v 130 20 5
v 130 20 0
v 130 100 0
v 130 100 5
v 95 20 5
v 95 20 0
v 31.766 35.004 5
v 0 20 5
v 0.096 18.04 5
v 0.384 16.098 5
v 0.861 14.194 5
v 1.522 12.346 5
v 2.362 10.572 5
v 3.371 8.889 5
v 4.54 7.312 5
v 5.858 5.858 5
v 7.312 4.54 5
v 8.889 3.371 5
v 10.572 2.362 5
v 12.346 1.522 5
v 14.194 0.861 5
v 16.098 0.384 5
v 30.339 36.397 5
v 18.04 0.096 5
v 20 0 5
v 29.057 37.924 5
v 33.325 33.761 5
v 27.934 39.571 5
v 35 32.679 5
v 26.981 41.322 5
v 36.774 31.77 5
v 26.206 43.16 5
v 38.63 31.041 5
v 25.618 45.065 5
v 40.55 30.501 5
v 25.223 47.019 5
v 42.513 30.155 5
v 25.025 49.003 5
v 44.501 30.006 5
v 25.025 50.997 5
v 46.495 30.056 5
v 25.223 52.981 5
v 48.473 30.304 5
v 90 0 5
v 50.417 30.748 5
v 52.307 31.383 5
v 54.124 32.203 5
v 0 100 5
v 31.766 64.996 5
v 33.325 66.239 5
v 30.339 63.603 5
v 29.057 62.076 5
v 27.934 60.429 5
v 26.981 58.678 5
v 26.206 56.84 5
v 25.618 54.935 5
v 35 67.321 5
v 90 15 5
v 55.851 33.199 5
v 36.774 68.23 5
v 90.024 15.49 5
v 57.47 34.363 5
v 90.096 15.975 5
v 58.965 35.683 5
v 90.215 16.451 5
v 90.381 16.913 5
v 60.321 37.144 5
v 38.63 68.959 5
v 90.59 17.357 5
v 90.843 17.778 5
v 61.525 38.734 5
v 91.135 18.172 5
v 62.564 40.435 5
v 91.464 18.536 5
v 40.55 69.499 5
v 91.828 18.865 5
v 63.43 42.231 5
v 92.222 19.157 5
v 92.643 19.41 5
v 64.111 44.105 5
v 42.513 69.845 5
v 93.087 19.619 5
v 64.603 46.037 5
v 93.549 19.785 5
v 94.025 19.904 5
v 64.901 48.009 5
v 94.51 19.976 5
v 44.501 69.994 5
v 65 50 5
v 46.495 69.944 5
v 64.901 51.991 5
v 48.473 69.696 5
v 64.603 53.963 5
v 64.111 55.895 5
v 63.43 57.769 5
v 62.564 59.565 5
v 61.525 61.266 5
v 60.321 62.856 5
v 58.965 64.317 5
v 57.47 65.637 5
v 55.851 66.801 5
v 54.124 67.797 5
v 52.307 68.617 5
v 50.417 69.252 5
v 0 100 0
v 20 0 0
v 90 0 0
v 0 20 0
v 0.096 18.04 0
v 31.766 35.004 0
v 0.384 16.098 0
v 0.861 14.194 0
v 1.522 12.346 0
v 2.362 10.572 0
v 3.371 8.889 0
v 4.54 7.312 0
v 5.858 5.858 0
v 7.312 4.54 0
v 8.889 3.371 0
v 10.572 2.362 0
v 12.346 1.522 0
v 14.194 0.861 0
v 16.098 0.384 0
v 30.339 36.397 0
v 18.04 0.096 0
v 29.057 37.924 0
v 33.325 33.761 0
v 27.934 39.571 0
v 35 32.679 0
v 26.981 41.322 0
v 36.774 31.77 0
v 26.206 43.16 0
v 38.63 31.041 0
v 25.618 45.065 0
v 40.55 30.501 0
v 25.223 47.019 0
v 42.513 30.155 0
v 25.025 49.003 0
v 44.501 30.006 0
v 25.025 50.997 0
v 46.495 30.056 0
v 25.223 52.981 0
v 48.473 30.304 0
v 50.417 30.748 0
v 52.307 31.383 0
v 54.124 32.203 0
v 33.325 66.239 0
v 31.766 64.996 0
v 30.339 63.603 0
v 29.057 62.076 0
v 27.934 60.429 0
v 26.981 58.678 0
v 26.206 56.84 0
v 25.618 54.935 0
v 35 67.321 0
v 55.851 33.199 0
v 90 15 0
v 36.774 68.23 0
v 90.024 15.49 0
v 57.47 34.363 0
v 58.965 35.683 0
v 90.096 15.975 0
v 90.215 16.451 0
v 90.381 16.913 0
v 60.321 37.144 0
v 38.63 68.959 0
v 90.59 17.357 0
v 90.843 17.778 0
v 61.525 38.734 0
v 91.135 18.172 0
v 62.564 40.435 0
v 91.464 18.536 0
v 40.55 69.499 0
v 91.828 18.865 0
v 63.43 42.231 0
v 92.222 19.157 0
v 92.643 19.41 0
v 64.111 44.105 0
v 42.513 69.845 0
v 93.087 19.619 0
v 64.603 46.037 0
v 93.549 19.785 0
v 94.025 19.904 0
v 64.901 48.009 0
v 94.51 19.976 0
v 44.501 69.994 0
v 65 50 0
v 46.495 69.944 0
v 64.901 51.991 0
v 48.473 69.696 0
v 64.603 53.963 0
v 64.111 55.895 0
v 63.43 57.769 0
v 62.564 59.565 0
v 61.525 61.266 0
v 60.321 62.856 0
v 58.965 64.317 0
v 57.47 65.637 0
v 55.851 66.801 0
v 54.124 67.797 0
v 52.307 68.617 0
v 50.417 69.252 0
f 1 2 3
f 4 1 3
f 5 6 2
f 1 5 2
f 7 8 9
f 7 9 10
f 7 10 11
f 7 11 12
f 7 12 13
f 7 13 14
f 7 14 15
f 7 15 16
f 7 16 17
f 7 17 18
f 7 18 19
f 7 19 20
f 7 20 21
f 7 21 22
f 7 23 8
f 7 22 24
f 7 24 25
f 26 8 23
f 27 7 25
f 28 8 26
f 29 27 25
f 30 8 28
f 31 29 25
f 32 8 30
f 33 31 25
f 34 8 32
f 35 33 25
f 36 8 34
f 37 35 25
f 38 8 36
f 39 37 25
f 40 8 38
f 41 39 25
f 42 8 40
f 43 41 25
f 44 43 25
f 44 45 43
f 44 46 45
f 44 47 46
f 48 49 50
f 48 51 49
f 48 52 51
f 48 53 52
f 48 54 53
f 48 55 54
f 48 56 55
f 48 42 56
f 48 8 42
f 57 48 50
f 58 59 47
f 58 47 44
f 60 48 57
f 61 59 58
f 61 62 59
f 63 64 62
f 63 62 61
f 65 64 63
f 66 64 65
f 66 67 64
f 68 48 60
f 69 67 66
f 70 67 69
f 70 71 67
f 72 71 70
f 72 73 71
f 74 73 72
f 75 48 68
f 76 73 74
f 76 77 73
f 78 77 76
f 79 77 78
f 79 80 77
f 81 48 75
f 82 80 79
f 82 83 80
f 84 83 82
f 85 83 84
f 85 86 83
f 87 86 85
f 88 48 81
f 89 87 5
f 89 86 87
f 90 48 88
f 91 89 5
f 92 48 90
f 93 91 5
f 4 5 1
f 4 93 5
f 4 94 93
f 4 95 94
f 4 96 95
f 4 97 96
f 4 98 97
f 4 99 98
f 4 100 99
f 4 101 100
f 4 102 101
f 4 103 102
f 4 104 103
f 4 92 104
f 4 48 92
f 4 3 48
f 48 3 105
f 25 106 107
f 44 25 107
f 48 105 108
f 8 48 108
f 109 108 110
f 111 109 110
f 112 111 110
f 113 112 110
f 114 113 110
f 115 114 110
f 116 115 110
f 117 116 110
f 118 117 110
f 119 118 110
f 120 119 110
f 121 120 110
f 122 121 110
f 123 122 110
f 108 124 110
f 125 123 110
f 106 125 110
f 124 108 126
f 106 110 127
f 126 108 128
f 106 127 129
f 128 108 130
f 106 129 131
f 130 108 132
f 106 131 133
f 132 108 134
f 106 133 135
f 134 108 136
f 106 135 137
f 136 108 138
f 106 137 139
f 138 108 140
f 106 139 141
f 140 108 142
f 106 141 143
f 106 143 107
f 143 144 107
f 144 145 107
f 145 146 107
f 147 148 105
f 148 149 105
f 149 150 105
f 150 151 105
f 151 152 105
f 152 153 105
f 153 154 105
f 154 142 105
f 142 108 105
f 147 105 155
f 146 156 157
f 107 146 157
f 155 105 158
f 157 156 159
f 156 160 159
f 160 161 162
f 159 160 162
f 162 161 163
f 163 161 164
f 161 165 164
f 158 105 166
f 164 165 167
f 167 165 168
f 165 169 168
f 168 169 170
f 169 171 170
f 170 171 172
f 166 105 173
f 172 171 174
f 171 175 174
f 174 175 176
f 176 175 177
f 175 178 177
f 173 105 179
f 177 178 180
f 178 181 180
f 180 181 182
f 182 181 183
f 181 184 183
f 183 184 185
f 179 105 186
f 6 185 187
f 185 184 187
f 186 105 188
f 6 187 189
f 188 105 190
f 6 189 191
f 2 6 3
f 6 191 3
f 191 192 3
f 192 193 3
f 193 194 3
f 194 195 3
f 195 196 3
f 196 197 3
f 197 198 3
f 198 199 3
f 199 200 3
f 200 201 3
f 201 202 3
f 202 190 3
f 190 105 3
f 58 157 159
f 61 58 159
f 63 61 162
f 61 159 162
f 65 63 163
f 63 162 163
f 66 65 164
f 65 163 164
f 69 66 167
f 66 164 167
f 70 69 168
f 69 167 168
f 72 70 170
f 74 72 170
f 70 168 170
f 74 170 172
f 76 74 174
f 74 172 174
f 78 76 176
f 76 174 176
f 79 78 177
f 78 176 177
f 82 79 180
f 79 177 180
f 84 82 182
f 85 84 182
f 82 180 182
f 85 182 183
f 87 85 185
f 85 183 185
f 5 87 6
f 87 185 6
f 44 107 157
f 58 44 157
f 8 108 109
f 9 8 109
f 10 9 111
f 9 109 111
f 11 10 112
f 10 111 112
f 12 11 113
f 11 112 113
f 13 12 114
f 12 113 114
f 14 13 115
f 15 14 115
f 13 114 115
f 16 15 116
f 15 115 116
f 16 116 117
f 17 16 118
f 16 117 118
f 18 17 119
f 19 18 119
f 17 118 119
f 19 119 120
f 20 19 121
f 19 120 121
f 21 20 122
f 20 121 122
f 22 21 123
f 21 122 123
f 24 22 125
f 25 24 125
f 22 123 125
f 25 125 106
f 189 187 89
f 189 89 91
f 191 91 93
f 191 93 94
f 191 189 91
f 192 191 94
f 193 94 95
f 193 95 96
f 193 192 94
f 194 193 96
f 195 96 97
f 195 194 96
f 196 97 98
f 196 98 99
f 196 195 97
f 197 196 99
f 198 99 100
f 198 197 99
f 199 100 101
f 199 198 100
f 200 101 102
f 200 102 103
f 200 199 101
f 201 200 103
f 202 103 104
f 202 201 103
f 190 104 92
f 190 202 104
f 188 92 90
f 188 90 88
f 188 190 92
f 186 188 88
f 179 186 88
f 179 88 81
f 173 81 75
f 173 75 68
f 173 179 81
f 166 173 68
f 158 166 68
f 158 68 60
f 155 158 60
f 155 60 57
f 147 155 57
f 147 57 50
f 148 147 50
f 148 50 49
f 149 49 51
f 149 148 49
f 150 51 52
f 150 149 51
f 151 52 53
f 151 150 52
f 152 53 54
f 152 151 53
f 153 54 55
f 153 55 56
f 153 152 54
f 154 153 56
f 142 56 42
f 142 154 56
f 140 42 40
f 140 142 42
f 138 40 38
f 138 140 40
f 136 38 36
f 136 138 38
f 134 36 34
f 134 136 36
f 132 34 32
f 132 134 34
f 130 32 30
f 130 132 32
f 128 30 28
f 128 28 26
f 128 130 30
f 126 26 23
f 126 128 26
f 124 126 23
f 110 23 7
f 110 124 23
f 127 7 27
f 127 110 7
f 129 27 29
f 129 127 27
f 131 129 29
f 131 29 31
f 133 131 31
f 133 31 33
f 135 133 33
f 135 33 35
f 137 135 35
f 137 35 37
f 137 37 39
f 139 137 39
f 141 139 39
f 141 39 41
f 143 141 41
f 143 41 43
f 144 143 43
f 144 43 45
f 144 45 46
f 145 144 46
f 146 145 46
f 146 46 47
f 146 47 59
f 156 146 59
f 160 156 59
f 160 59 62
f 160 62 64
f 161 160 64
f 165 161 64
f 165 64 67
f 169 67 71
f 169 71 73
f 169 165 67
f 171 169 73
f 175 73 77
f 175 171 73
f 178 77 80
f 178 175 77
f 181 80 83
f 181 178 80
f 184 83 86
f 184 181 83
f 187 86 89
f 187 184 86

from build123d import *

# Parameters (mm, degrees)
SKIZZE1_R                       = 20
AUFSATZ_LINEAR_AUSTRAGEN1_DEPTH = 5


with BuildPart() as part:
    # Skizze1 → Aufsatz-Linear austragen1 (new body)
    with BuildSketch(Plane.XY):
        with BuildLine():
            Line((20, 0), (90, 0))
            Line((90, 0), (90, 15))
            ThreePointArc((90, 15), (91.464466094, 18.535533906), (95, 20))
            Line((95, 20), (130, 20))
            Line((130, 20), (130, 100))
            Line((130, 100), (0, 100))
            Line((0, 100), (0, 20))
            ThreePointArc((0, 20), (5.857864376, 5.857864376), (20, 0))
        make_face()
        with Locations((45, 50)):
            Circle(SKIZZE1_R, mode=Mode.SUBTRACT)
    extrude(amount=AUFSATZ_LINEAR_AUSTRAGEN1_DEPTH)


solid = part.part
